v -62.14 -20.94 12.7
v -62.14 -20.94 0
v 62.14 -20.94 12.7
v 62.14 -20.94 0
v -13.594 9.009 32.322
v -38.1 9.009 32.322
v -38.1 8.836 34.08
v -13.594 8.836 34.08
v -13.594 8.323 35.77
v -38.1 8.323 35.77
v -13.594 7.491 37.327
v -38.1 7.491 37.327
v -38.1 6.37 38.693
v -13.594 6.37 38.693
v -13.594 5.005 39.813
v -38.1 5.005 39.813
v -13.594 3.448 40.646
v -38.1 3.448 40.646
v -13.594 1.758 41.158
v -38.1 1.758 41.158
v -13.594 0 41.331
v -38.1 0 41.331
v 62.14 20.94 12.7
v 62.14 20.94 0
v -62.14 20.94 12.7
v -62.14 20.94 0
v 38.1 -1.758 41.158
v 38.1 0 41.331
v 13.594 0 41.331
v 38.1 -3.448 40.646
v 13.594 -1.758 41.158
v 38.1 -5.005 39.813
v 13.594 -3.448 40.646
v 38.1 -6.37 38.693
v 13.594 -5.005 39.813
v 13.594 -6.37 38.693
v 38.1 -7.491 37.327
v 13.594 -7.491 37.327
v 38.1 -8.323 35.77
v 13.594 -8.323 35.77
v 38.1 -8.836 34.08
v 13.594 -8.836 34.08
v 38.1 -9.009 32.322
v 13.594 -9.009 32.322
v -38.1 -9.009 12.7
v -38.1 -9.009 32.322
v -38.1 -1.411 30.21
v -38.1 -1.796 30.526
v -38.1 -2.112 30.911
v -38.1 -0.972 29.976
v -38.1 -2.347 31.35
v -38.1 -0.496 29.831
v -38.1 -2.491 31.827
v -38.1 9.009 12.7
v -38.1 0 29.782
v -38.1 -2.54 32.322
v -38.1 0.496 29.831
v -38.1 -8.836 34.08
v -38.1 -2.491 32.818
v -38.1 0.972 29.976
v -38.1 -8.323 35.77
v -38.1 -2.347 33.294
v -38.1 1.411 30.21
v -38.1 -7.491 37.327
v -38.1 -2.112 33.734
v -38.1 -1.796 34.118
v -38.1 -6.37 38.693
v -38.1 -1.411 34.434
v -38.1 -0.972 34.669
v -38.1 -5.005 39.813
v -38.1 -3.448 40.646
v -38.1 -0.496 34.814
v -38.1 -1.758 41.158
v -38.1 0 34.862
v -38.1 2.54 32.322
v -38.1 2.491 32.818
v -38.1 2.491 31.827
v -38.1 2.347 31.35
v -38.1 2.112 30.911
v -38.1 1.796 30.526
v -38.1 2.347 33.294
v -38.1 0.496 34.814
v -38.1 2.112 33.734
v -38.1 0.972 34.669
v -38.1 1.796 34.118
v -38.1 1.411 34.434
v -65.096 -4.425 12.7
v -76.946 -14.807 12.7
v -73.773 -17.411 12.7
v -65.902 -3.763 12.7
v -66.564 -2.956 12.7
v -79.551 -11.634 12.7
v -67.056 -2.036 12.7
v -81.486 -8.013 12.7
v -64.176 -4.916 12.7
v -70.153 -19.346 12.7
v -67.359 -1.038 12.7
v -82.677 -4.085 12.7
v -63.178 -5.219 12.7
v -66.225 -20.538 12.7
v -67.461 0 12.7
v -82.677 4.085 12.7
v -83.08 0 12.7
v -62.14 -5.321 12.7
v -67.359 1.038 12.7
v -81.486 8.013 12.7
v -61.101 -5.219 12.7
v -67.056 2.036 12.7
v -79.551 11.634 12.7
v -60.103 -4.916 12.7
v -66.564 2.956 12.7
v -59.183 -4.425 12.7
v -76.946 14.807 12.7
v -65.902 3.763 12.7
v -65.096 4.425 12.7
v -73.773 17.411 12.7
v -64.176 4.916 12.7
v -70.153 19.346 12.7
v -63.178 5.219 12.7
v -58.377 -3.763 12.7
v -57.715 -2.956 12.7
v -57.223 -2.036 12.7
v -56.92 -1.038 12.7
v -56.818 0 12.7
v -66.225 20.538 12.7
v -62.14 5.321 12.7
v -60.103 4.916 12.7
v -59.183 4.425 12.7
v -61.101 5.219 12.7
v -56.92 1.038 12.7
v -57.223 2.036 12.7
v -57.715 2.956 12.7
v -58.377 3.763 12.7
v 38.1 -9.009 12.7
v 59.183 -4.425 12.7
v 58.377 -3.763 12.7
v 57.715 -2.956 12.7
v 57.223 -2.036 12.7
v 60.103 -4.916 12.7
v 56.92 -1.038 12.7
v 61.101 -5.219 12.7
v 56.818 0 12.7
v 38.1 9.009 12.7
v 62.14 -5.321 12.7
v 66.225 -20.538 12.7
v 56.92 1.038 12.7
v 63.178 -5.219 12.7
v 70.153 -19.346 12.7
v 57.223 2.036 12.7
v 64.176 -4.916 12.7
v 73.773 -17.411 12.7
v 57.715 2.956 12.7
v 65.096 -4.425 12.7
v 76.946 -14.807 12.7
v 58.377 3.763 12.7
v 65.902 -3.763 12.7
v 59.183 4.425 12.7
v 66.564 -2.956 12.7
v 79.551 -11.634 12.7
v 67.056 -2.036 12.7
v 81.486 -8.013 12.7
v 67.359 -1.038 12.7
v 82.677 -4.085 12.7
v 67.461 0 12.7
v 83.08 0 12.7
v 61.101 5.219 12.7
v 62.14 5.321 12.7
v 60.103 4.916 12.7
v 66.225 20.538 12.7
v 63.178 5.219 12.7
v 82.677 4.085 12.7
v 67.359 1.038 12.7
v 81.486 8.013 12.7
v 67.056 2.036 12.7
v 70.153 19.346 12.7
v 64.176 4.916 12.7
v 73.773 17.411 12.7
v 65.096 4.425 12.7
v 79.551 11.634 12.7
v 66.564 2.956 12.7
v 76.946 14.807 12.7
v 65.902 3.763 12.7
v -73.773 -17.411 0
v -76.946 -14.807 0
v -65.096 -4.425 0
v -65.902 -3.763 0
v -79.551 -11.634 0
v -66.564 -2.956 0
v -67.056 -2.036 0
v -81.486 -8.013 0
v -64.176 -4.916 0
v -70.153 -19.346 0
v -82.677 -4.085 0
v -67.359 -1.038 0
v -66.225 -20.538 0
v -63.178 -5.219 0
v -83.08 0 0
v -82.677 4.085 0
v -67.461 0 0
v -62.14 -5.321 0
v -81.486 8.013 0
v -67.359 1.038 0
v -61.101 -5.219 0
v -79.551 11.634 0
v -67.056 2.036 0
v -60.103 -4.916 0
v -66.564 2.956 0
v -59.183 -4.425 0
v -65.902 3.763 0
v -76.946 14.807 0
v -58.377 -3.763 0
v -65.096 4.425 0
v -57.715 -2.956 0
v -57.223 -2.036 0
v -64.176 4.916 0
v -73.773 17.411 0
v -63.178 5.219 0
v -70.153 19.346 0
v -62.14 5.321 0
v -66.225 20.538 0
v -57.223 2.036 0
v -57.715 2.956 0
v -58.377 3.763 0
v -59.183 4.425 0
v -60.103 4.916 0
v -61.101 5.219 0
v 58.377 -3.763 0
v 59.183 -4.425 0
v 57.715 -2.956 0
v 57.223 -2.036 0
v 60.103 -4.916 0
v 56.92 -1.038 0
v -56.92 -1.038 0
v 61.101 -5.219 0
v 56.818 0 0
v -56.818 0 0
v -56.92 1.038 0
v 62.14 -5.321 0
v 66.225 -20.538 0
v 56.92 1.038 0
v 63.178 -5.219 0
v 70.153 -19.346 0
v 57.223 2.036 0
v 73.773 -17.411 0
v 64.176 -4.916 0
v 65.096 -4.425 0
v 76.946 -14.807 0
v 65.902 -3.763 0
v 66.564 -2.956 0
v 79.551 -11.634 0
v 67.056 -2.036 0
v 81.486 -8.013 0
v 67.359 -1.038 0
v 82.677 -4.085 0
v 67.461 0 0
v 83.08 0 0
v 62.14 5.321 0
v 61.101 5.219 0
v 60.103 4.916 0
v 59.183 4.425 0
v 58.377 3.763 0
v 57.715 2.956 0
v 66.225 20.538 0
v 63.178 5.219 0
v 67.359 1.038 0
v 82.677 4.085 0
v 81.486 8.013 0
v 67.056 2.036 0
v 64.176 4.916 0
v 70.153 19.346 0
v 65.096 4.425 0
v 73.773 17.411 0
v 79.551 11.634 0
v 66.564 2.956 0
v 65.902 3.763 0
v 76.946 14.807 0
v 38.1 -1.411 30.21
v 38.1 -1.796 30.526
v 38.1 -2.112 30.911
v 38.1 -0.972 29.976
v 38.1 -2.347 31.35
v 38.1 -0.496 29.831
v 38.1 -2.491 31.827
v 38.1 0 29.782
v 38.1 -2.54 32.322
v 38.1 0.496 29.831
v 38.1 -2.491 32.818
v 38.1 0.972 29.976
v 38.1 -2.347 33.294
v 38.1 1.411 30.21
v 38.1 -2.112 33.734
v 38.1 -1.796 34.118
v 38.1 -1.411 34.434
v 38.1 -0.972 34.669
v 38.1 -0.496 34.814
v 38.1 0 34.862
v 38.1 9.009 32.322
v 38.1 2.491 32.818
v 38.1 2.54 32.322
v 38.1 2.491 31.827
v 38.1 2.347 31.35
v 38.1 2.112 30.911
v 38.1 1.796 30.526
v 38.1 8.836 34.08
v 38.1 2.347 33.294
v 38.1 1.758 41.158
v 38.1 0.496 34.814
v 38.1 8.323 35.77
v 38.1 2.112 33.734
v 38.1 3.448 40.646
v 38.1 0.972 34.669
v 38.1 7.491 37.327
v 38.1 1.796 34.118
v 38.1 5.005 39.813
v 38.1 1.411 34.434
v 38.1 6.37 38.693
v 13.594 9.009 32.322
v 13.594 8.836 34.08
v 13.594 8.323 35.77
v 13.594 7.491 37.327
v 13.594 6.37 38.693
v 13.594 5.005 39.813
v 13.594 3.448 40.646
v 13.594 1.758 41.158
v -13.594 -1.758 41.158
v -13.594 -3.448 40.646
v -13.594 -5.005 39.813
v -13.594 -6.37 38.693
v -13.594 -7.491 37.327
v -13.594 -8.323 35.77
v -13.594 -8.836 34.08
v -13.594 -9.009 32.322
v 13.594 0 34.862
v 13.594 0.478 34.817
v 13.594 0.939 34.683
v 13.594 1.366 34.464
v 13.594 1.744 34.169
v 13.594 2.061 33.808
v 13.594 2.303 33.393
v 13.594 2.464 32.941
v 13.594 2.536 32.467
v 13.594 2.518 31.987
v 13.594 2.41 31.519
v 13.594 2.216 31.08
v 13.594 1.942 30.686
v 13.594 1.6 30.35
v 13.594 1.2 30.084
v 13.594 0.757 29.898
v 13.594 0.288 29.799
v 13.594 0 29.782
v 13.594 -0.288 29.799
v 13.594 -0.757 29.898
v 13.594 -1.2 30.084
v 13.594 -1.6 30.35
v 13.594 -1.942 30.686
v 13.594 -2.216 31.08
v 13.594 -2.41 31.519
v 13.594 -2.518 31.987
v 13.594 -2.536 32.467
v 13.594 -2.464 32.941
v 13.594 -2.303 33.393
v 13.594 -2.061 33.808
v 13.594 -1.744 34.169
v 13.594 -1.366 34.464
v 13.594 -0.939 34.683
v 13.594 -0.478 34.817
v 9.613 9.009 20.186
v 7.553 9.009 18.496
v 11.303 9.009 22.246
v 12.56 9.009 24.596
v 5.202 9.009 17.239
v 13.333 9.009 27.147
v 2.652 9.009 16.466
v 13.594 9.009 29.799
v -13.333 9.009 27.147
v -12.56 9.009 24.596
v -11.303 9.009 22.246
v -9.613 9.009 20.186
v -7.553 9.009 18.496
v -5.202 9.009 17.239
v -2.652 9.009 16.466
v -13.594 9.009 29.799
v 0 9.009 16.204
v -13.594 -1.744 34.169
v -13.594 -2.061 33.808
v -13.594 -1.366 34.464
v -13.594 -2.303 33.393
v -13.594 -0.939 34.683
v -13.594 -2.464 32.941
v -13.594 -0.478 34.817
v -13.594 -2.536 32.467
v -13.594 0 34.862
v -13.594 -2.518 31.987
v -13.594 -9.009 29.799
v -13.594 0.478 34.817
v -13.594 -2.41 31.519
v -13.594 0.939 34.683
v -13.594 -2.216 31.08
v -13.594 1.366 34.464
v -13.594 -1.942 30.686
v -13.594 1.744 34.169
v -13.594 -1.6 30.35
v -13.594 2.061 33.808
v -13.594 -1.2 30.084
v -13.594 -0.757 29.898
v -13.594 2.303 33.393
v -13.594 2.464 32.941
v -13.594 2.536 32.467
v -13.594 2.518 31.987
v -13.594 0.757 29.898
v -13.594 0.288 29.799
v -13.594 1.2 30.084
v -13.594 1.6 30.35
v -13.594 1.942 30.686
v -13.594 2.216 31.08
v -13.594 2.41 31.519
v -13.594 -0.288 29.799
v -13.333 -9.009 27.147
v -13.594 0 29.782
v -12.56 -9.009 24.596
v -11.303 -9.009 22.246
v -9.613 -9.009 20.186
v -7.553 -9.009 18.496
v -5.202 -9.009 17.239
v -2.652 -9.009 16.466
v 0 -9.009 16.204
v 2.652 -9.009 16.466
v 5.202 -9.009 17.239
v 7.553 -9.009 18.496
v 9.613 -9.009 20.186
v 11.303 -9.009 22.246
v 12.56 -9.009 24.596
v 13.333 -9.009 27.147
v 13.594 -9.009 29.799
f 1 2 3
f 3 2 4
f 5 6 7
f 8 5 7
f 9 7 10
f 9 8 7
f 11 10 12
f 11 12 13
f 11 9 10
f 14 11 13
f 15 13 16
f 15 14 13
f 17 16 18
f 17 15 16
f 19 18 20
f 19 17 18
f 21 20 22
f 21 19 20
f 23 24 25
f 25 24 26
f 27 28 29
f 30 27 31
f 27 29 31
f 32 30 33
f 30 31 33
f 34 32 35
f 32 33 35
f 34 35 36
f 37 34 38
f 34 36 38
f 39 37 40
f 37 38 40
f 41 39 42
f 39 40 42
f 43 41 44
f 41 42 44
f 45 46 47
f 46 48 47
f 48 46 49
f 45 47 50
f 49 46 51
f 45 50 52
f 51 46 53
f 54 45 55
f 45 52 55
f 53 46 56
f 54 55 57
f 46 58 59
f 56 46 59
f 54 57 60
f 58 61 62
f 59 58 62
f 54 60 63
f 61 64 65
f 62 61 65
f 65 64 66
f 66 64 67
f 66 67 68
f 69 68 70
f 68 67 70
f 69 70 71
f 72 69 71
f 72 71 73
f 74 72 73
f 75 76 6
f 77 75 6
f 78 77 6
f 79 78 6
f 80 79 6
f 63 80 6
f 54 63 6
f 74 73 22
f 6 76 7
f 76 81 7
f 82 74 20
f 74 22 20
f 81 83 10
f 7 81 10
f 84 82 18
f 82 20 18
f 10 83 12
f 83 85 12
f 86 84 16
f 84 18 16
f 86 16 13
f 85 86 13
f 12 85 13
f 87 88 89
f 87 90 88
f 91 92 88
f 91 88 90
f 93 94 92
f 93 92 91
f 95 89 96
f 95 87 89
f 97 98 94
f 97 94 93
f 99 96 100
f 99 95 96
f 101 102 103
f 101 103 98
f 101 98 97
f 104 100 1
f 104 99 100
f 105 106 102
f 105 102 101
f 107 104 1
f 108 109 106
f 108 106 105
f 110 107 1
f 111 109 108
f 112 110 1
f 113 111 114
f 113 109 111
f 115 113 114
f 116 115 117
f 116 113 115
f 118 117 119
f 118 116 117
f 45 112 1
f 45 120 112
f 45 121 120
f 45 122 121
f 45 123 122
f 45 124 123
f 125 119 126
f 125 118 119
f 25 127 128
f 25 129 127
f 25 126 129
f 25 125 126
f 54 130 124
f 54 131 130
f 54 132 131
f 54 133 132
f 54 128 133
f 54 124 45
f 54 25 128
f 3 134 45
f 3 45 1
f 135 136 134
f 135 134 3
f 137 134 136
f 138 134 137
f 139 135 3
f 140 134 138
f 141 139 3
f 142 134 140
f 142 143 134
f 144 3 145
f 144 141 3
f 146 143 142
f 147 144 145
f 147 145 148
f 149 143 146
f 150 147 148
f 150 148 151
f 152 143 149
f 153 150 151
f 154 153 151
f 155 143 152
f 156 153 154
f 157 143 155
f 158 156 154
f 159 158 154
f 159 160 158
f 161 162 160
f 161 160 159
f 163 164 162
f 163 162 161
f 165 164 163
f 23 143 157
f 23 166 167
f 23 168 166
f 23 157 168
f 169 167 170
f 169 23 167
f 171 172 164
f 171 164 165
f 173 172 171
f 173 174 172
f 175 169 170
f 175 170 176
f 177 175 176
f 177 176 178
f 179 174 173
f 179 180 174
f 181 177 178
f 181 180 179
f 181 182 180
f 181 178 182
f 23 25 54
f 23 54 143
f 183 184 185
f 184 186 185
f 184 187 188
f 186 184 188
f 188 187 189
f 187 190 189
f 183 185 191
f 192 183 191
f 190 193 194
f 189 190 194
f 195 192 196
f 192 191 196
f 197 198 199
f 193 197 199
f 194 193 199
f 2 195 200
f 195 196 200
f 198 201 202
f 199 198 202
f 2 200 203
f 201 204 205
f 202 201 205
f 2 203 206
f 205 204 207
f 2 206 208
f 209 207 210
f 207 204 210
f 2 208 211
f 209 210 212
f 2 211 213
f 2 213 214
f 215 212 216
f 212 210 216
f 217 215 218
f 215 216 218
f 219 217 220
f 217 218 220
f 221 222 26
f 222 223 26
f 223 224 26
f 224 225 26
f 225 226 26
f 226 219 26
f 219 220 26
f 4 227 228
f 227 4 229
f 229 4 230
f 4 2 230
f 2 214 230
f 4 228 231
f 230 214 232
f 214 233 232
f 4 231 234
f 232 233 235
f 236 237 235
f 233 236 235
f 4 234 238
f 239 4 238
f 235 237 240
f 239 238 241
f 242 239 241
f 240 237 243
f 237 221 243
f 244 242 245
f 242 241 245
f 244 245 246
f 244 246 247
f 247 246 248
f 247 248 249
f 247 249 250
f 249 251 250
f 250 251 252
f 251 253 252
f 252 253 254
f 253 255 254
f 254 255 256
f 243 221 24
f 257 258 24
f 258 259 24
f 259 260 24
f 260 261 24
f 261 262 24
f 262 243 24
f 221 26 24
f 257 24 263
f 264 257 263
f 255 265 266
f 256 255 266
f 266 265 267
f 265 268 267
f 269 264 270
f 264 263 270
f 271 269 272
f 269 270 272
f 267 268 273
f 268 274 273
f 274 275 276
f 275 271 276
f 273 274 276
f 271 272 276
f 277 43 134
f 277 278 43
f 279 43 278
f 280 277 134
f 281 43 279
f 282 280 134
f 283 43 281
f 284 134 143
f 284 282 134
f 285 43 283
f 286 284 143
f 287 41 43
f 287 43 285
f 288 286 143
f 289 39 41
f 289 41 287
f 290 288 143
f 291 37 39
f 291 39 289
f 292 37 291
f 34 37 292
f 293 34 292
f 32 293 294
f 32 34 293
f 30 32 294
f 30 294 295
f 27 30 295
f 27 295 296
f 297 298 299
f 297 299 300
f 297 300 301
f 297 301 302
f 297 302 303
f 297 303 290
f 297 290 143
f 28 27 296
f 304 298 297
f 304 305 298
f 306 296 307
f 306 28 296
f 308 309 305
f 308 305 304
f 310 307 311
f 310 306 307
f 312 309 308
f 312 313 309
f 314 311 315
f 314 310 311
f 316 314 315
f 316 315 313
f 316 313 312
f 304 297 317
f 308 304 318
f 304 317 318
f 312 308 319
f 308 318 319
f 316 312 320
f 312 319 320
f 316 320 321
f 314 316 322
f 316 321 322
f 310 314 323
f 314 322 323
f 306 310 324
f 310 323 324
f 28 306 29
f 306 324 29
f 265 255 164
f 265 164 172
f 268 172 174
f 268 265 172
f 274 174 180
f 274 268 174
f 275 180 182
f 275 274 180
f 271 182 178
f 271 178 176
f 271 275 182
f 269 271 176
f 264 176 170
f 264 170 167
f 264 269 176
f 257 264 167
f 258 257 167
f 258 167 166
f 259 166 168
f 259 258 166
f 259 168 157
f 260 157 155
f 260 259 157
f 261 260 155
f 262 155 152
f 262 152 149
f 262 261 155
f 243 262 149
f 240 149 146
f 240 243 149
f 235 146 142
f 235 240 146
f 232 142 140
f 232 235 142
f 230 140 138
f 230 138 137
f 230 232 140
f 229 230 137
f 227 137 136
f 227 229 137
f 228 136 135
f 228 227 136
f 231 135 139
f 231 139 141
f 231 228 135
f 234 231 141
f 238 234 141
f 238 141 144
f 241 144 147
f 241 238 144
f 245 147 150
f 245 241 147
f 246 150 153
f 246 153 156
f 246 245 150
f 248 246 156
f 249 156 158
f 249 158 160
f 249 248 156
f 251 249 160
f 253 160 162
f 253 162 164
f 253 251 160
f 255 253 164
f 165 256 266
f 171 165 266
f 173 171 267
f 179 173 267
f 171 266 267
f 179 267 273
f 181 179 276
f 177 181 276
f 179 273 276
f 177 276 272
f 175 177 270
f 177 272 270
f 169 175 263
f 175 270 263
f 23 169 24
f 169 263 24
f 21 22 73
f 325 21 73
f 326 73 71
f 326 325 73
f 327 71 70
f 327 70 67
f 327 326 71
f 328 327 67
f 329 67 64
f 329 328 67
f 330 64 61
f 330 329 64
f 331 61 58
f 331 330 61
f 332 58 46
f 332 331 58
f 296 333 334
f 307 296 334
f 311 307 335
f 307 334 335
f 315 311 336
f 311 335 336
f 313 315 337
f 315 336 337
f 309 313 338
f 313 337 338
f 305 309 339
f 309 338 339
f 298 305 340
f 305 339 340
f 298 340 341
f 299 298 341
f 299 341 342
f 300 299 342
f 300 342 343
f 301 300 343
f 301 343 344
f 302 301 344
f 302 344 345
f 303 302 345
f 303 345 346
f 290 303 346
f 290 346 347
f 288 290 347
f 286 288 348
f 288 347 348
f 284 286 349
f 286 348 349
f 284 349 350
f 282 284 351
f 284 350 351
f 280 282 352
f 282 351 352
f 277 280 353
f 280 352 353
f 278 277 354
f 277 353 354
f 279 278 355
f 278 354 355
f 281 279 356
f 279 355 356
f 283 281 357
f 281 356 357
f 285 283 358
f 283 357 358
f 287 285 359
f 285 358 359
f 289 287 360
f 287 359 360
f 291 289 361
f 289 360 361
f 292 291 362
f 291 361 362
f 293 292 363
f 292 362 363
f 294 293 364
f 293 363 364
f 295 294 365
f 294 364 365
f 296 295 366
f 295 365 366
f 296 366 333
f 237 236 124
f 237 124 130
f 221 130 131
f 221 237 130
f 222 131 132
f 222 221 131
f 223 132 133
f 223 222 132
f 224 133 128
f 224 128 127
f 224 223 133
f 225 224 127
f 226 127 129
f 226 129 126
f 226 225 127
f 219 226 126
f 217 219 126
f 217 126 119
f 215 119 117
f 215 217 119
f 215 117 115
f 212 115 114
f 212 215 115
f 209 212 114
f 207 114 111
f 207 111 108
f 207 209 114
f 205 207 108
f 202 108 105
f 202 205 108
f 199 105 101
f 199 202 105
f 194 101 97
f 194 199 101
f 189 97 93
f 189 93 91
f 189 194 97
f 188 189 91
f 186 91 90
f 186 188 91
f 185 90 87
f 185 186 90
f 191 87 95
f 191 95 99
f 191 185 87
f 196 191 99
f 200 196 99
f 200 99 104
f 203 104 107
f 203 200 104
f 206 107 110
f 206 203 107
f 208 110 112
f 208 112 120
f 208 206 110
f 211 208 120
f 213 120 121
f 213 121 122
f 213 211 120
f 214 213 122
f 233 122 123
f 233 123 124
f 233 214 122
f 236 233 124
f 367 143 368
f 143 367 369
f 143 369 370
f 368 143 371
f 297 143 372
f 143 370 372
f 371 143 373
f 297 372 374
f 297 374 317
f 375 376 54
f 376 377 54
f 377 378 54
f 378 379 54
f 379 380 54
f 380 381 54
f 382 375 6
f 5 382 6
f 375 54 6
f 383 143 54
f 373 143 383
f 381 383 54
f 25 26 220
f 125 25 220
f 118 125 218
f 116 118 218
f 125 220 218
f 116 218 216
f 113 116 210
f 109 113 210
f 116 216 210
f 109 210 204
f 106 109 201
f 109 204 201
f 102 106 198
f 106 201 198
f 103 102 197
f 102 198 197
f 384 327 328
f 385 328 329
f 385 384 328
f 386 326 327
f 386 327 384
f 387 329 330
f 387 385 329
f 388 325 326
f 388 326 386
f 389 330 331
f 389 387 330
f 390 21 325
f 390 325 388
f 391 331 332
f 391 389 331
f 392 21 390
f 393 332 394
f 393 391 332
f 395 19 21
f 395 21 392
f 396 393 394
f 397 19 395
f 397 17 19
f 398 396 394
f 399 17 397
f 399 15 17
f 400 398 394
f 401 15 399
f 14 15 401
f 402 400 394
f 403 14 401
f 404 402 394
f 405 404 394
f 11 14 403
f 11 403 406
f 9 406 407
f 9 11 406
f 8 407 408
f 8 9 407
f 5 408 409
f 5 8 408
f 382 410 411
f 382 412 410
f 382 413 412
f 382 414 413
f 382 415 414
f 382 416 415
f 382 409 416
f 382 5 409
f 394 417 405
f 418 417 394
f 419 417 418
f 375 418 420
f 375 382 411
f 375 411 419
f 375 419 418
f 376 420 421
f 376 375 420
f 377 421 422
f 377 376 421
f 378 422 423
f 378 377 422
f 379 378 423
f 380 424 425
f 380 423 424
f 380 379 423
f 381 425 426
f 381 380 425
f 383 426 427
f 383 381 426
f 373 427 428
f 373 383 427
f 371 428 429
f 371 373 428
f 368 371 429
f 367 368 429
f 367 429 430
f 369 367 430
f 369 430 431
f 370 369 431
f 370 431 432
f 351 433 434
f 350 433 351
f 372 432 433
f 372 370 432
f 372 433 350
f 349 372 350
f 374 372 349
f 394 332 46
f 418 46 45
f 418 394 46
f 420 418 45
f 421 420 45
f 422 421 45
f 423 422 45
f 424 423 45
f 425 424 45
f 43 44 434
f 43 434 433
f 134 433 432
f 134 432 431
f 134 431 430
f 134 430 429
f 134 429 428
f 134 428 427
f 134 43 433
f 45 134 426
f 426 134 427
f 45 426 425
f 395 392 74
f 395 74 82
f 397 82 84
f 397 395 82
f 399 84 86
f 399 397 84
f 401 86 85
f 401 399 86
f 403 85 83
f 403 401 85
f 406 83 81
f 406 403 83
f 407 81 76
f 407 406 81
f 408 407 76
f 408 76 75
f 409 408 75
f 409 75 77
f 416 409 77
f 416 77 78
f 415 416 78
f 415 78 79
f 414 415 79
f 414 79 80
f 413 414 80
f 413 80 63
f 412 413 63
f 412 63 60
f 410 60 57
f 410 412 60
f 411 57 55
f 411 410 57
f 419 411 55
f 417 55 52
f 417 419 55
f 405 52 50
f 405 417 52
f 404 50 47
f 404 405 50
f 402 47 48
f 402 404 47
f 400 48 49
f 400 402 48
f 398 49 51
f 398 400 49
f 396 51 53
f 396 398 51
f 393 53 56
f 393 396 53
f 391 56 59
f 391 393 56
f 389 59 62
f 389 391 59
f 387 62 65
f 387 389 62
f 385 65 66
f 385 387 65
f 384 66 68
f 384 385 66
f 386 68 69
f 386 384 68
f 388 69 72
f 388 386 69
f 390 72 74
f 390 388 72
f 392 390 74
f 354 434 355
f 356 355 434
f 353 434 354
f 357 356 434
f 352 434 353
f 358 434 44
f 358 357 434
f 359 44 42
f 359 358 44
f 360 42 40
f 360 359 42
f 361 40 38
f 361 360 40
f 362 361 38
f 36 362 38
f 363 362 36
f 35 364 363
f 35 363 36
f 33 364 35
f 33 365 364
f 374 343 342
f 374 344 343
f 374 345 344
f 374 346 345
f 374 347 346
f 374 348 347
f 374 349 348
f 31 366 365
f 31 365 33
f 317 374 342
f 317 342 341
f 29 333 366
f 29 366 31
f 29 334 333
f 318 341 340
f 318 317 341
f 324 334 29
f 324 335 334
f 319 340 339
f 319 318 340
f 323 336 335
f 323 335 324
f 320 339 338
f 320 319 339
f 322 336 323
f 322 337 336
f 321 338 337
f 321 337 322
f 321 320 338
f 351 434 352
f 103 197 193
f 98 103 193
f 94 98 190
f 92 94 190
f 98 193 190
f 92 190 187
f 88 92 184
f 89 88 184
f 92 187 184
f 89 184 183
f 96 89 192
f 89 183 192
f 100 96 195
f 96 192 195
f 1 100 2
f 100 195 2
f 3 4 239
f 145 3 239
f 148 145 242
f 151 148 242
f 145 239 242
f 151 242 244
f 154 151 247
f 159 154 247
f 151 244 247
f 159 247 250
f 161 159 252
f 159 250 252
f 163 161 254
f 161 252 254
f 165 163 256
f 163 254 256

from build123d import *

# Parameters (mm, degrees)
F0_R          = 5.3213500883
F1_DEPTH      = 12.7
F3_DEPTH      = 38.1
F3_DEPTH_BACK = 38.1
F5_DEPTH      = 20.9411715547
F5_DEPTH_BACK = 20.9411715547


with BuildPart() as f1:
    # F0 (on Top) → F1 (new body)
    with BuildSketch(Plane.XY):
        with BuildLine():
            Line((62.1395111084, 20.9401715547), (0, 20.9401715547))
            Line((0, 20.9401715547), (-62.1395111084, 20.9401715547))
            ThreePointArc((-62.1395111084, 20.9401715547), (-76.9464484139, 14.8069373055), (-83.0796826631, 0))
            ThreePointArc((-83.0796826631, 0), (-76.9464484139, -14.8069373055), (-62.1395111084, -20.9401715547))
            Line((-62.1395111084, -20.9401715547), (0, -20.9401715547))
            Line((0, -20.9401715547), (62.1395111084, -20.9401715547))
            ThreePointArc((62.1395111084, -20.9401715547), (76.9464484139, -14.8069373055), (83.0796826631, 0))
            ThreePointArc((83.0796826631, 0), (76.9464484139, 14.8069373055), (62.1395111084, 20.9401715547))
        make_face()
        with Locations((-62.1395111084, 0)):
            Circle(F0_R, mode=Mode.SUBTRACT)
        with Locations((62.1395111084, 0)):
            Circle(F0_R, mode=Mode.SUBTRACT)
    extrude(amount=F1_DEPTH)

    # F2 (on Right) → F3 (join, two sides)
    with BuildSketch(Plane.YZ) as f3_sk:
        with BuildLine():
            Line((-9.0088532658, 12.7), (0, 12.7))
            Line((0, 12.7), (9.0088532658, 12.7))
            Line((9.0088532658, 12.7), (9.0088532658, 32.3224291205))
            ThreePointArc((9.0088532658, 32.3224291205), (6.370221235, 38.6926503555), (0, 41.3312823864))
            ThreePointArc((0, 41.3312823864), (-6.370221235, 38.6926503555), (-9.0088532658, 32.3224291205))
            Line((-9.0088532658, 32.3224291205), (-9.0088532658, 12.7))
        make_face()
        with BuildLine():
            ThreePointArc((0, 29.7824291205), (-2.54, 32.3224291205), (0, 34.8624291205))
            ThreePointArc((0, 34.8624291205), (2.54, 32.3224291205), (0, 29.7824291205))
        make_face(mode=Mode.SUBTRACT)
    extrude(amount=F3_DEPTH)
    extrude(f3_sk.sketch, amount=-F3_DEPTH_BACK)

    # F4 (on Front) → F5 (cut, two sides)
    with BuildSketch(Plane.XZ) as f5_sk:
        with BuildLine():
            Line((13.5943368077, 41.3312823864), (-13.5943368077, 41.3312823864))
            Line((-13.5943368077, 41.3312823864), (-13.5943368077, 29.7987964004))
            ThreePointArc((-13.5943368077, 29.7987964004), (-9.6126477425, 20.1861486579), (0, 16.2044595927))
            ThreePointArc((0, 16.2044595927), (9.6126477425, 20.1861486579), (13.5943368077, 29.7987964004))
            Line((13.5943368077, 29.7987964004), (13.5943368077, 41.3312823864))
        make_face()
    extrude(amount=-F5_DEPTH, mode=Mode.SUBTRACT)
    extrude(f5_sk.sketch, amount=F5_DEPTH_BACK, mode=Mode.SUBTRACT)


solid = f1.part
